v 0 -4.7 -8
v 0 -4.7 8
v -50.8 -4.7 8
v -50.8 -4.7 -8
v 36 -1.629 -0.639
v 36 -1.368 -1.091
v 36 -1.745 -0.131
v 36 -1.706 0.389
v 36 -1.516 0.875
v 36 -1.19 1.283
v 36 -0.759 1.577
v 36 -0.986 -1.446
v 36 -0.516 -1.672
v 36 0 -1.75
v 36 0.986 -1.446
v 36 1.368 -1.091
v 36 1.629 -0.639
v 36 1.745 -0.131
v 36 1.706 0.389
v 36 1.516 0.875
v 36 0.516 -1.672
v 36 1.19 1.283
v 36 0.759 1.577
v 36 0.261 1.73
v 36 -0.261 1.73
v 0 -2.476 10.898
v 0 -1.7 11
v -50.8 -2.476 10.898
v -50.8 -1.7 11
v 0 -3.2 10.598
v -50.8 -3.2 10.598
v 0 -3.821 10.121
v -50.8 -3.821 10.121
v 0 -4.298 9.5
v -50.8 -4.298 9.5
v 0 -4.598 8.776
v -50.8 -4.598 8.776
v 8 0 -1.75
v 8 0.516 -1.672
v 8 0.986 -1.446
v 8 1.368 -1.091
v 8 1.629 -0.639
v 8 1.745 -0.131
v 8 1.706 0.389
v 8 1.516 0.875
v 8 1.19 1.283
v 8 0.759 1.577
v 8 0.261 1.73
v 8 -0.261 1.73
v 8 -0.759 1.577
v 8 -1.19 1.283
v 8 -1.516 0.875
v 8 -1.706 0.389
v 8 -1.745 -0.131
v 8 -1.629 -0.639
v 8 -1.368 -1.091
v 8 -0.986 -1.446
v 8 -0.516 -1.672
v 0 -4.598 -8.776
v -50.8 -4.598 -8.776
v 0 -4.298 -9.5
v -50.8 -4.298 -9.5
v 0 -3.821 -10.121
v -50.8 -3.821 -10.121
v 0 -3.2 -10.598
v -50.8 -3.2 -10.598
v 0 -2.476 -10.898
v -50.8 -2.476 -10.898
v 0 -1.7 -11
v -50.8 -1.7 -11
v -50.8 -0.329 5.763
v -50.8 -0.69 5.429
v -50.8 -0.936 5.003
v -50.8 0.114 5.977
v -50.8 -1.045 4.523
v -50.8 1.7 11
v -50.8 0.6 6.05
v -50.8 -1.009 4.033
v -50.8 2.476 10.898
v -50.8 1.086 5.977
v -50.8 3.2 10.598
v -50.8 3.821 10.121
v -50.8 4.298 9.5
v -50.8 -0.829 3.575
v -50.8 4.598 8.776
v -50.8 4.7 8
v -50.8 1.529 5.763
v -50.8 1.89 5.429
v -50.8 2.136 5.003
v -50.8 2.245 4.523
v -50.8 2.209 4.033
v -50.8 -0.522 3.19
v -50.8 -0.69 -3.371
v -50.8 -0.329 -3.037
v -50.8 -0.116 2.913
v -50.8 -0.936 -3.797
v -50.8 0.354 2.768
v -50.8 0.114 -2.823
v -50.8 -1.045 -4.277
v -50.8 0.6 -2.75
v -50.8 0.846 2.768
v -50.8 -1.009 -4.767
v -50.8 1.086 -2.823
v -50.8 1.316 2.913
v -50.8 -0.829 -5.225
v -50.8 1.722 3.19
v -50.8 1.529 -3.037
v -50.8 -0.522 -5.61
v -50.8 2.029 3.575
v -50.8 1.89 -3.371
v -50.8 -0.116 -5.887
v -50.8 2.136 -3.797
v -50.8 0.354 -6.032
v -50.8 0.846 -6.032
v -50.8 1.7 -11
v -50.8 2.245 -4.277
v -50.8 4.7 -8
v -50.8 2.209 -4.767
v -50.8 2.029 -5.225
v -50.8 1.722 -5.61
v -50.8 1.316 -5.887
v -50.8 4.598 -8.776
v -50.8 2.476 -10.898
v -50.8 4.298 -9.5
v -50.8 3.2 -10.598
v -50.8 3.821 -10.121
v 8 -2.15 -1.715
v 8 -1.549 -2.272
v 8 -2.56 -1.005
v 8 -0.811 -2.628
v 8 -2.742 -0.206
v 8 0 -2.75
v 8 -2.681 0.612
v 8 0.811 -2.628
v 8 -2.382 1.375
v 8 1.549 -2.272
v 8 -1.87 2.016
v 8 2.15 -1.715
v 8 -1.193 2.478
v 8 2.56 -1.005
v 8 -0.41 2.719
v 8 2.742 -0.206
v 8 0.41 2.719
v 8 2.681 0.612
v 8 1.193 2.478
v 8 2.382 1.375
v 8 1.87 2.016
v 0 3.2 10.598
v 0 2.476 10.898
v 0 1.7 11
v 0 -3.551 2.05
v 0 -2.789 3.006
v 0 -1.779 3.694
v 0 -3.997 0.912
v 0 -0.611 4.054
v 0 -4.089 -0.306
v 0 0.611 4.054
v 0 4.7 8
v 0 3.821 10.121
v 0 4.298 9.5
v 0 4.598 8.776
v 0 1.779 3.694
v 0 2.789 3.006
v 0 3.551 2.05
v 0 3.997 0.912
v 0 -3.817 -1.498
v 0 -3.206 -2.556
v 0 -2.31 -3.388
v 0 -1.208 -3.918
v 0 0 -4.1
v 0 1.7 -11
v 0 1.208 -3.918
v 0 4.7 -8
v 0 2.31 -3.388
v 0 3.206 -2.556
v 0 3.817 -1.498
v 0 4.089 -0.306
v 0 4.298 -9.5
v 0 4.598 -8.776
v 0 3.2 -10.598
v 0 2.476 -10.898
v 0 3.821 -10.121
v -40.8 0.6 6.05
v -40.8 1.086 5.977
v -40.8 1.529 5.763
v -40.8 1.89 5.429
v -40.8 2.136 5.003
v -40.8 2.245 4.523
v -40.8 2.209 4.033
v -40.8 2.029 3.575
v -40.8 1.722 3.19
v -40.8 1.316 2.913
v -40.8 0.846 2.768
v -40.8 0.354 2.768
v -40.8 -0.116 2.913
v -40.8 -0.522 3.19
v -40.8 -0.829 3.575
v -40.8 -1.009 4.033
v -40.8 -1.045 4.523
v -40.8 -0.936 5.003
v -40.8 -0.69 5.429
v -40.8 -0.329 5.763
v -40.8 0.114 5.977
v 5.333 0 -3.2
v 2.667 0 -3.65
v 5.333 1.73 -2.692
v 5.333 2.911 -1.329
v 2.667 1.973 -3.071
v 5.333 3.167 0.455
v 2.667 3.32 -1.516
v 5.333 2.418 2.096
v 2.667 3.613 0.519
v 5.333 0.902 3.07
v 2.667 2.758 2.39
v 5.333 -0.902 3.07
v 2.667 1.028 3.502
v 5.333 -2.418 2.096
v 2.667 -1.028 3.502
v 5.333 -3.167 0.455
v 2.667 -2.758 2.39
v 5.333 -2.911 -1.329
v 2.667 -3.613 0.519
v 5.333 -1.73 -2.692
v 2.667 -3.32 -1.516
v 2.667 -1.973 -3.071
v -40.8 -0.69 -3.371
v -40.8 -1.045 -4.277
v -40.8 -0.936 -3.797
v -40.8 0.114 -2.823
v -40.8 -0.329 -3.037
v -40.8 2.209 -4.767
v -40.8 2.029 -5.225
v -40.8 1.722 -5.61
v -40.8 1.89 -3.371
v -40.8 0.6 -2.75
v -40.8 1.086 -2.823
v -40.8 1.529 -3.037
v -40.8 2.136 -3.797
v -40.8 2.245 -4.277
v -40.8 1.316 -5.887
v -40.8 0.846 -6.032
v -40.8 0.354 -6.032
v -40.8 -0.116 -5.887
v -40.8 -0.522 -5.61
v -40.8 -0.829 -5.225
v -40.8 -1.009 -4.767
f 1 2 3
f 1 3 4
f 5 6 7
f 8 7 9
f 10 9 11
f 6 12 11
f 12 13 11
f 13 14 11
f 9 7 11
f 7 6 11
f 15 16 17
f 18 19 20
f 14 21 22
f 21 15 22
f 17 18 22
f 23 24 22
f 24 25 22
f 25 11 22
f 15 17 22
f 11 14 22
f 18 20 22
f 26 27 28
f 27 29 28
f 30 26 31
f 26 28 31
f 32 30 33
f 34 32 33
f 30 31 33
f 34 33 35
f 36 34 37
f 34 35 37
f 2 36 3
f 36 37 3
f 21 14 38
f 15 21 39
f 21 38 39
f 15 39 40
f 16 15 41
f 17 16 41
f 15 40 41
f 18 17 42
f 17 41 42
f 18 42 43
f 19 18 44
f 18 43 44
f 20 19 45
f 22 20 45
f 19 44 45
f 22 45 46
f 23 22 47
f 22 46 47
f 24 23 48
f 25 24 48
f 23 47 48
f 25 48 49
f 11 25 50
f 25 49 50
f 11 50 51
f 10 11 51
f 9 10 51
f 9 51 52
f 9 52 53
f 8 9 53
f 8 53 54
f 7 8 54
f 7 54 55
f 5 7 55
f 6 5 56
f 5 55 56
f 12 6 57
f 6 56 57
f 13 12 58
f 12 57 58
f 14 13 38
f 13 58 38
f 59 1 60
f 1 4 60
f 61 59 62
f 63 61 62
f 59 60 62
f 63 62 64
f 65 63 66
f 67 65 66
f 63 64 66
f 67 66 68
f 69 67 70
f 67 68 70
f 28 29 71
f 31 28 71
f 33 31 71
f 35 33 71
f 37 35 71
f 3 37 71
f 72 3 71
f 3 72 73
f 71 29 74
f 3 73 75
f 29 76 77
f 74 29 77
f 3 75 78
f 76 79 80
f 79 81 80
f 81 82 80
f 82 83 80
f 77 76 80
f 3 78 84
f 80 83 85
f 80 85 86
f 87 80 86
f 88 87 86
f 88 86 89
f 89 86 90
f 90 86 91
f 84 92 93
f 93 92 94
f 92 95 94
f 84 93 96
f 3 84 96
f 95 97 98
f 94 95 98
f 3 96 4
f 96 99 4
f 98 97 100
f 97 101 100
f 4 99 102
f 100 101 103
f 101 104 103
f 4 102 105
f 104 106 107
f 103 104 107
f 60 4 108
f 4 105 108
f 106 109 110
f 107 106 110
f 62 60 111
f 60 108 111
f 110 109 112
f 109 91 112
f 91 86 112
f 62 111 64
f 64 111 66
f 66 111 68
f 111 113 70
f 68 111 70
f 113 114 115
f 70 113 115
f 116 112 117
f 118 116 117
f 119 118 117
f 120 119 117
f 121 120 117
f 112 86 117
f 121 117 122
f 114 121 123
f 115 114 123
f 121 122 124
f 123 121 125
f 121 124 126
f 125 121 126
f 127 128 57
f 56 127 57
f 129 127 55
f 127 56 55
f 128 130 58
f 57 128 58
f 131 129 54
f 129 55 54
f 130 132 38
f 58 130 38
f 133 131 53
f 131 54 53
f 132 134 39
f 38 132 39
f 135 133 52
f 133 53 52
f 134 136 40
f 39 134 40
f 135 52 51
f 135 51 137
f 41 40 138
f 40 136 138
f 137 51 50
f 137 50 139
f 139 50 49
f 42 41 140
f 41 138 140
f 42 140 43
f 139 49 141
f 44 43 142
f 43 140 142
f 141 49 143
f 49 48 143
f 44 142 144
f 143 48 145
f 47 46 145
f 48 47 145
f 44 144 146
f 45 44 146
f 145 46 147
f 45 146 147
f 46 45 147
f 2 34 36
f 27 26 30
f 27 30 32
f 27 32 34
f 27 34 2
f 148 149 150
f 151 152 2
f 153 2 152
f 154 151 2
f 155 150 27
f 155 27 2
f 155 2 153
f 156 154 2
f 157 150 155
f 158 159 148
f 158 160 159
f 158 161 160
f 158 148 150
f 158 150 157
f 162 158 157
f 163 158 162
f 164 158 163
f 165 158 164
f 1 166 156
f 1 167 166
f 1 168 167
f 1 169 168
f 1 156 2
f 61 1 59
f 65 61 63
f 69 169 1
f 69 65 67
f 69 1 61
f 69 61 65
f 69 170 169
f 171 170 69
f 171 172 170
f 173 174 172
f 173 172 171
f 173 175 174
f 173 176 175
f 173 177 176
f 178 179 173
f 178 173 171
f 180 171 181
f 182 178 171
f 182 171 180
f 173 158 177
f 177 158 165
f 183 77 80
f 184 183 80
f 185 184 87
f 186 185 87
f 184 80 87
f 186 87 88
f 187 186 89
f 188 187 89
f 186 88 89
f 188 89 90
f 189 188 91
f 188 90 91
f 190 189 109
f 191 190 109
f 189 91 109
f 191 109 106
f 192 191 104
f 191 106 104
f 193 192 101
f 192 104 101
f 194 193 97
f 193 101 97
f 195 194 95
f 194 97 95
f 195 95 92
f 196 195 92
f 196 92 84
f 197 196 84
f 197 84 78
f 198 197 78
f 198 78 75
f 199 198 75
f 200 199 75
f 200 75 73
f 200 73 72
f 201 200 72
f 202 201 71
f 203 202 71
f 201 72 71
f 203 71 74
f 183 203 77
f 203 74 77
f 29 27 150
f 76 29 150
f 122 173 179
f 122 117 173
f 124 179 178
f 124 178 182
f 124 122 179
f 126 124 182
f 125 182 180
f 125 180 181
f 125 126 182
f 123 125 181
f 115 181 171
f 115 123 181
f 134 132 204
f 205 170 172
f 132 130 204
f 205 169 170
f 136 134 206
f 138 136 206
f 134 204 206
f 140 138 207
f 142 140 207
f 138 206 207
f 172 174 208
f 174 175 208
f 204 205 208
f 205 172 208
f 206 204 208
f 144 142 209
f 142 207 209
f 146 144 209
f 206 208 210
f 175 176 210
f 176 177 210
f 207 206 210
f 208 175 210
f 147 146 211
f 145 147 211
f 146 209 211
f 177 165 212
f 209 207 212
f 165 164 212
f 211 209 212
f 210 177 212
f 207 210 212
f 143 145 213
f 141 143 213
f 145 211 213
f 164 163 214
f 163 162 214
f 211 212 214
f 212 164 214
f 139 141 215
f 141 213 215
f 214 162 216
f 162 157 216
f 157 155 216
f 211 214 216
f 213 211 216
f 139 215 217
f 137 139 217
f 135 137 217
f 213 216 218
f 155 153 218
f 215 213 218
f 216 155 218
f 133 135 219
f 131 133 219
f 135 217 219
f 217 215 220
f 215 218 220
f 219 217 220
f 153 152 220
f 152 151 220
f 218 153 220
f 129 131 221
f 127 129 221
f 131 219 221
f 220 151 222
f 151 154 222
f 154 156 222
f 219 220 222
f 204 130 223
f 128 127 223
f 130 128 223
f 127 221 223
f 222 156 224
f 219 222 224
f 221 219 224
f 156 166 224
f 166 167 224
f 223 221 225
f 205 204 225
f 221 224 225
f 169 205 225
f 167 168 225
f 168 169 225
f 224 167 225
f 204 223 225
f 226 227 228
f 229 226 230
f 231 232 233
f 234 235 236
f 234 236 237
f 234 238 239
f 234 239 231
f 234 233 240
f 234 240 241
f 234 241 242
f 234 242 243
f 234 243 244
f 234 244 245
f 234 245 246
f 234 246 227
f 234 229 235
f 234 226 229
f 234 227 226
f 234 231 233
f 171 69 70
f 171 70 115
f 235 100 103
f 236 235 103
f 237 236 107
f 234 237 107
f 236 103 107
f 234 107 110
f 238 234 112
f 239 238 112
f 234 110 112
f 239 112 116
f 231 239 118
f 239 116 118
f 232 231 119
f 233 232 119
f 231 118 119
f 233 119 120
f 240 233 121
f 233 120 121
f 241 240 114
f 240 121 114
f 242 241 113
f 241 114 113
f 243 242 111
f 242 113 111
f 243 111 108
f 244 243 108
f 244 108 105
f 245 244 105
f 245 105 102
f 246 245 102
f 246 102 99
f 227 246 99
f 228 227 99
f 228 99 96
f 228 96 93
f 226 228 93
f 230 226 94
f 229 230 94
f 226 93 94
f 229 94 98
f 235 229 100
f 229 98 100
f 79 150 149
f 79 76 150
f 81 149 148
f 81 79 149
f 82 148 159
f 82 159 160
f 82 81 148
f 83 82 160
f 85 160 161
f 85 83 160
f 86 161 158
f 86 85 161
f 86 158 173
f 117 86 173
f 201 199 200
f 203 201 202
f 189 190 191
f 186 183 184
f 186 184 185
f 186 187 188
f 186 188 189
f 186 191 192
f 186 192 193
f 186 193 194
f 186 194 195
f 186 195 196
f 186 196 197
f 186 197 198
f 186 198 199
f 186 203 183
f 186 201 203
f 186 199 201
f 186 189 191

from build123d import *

# Parameters (mm, degrees)
SKETCH_1_W          = 22
SKETCH_1_H          = 9.4
EXTRUDE_1_DEPTH     = 50.8
FILLET_1_R          = 3
SKETCH_4_R          = 1.65
CUT_EXTRUDE_1_DEPTH = 10


with BuildPart() as part:
    # Эскиз1 → Бобышка-Вытянуть1 (new body)
    with BuildSketch(Plane(origin=(0, 0, 0), x_dir=(0, 0, -1), z_dir=(1, 0, 0))):
        Rectangle(SKETCH_1_W, SKETCH_1_H)
    extrude(amount=-EXTRUDE_1_DEPTH)

    # Эскиз3 → Повернуть1 (revolve)
    with BuildSketch(Plane(origin=(0, 0, 0), x_dir=(1, 0, 0), z_dir=(0, 1, 0))):
        Polygon((8, 2.75), (0, 4.1), (0, 0), (36, 0), (36, 1.75), (8, 1.75), align=None)
    revolve(axis=Axis((0, 0, 0), (1, 0, 0)))

    # Скругление1
    fillet_1_edges = [part.edges().sort_by_distance(p)[0] for p in [
        (-25.4, -4.7, 11),
        (-25.4, 4.7, 11),
        (-25.4, 4.7, -11),
        (-25.4, -4.7, -11),
    ]]
    fillet(fillet_1_edges, radius=FILLET_1_R)

    # Эскиз4 → Вырез-Вытянуть1 (cut)
    with BuildSketch(Plane.ZY.offset(50.8)):
        with Locations((-4.4, 0.6)):
            Circle(SKETCH_4_R)
        with Locations((4.4, 0.6)):
            Circle(SKETCH_4_R)
    extrude(amount=-CUT_EXTRUDE_1_DEPTH, mode=Mode.SUBTRACT)


solid = part.part
